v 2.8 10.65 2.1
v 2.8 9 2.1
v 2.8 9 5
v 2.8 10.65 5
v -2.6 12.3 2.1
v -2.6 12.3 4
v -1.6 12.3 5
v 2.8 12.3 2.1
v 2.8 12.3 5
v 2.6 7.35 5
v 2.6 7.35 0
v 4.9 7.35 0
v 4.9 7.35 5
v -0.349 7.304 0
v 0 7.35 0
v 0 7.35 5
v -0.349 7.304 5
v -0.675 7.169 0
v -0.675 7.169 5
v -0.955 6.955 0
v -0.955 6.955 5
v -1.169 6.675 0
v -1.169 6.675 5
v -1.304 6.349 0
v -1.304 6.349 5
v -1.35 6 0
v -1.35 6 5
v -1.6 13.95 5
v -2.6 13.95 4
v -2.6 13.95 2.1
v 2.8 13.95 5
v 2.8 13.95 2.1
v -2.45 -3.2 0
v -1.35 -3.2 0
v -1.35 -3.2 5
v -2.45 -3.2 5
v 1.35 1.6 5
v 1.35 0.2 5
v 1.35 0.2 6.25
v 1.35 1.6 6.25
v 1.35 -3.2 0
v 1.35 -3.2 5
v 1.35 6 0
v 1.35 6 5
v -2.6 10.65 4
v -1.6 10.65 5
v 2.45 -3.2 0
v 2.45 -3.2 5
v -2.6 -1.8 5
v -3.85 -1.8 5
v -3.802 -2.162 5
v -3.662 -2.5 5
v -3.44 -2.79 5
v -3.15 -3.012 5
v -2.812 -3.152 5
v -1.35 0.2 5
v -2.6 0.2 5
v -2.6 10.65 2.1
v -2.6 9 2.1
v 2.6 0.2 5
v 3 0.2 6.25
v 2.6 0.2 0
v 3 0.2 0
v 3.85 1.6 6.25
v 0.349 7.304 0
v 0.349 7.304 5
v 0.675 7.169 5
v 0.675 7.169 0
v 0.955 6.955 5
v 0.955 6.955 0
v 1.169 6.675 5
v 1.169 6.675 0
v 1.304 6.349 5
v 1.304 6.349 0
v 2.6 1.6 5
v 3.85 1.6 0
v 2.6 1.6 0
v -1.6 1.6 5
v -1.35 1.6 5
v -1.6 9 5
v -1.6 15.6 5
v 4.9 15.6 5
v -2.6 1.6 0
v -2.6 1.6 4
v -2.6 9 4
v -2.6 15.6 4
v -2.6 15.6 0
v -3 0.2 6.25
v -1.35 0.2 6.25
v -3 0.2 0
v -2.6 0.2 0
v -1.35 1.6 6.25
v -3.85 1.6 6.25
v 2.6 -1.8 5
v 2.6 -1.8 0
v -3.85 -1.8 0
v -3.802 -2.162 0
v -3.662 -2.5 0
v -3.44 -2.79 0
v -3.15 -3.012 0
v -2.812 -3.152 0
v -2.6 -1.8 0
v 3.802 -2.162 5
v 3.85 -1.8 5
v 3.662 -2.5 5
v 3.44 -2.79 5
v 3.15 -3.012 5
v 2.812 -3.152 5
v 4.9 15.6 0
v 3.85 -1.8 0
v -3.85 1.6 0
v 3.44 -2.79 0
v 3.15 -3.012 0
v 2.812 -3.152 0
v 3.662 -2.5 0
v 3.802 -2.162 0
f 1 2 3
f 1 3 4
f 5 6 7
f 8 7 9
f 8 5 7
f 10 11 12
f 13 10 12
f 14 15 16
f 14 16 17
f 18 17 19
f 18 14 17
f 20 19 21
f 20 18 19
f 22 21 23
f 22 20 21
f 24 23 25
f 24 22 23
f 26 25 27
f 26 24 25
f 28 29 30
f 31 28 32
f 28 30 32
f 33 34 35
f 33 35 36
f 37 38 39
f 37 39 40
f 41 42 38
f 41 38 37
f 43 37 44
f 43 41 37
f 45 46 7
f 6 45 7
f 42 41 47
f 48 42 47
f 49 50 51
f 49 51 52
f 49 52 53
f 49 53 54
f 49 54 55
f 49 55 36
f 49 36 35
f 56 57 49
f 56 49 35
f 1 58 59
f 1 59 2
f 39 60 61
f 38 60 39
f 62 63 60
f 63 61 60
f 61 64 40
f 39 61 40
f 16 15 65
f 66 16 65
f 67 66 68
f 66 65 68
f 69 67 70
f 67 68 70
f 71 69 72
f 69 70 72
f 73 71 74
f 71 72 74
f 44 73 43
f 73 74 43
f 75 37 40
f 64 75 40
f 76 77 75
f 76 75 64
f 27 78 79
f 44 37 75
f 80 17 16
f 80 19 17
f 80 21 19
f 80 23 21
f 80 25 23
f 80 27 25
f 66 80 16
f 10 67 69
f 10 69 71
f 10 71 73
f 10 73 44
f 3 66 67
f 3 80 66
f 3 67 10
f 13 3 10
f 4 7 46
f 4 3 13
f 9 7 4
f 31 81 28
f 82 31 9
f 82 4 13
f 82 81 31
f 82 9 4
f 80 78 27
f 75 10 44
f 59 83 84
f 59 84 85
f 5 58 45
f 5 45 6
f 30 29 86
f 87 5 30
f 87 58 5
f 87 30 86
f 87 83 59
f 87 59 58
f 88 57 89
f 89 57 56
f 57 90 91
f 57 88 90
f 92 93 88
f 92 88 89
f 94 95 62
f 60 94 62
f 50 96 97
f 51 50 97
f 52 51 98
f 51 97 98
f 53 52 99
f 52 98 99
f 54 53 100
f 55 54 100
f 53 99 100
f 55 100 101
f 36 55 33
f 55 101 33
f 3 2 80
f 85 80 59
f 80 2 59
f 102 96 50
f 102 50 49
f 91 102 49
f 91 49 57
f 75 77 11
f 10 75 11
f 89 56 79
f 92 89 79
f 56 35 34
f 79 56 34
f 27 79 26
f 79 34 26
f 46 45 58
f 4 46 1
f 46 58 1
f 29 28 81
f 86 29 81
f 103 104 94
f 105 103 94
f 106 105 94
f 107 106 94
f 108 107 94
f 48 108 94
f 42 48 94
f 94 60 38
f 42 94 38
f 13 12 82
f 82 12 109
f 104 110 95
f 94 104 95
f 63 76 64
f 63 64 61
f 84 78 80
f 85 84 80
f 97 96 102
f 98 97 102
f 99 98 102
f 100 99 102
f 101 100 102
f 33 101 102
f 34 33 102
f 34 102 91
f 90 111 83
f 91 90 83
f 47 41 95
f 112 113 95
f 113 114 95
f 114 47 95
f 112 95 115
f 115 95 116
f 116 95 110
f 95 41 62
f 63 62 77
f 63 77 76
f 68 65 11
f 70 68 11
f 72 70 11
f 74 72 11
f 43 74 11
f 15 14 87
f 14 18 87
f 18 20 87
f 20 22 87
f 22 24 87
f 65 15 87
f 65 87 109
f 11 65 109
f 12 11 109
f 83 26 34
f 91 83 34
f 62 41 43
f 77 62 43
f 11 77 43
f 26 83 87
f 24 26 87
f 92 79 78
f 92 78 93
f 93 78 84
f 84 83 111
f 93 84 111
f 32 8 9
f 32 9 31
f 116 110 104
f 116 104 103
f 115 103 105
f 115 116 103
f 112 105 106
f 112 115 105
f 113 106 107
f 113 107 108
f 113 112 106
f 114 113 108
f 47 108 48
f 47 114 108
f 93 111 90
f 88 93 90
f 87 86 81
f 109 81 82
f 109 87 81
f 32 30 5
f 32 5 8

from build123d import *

# Parameters (mm, degrees)
PAD017_DEPTH           = 5
PAD020_DEPTH           = 6.25
SKETCH105_W            = 7.5
SKETCH105_H            = 1.65
PAD074_DEPTH           = 5
SKETCH102_W            = 7.5
SKETCH102_H            = 1.65
PAD075_DEPTH           = 2.1
SKETCH103_W            = 2.1
SKETCH103_H            = 1.65
PAD076_DEPTH           = 5
SKETCH104_W            = 7.5
SKETCH104_H            = 1.65
PAD077_DEPTH           = 5
LINEARPATTERN024_COUNT = 2
LINEARPATTERN024_PITCH = 3.3
CHAMFER014_SIZE        = 1


with BuildPart() as bc_c:
    # Sketch034 → Pad017 (new body)
    with BuildSketch(Plane.XY):
        with BuildLine():
            Line((-1.35, -1.8), (-1.35, 6))
            ThreePointArc((0, 7.35), (-0.954594, 6.954594), (-1.35, 6))
            Line((0, 9), (0, 7.35))
            Line((-2.6, 9), (0, 9))
            Line((-2.6, -1.8), (-2.6, 9))
            Line((-3.85, -1.8), (-2.6, -1.8))
            ThreePointArc((-3.85, -1.8), (-3.439949, -2.789949), (-2.45, -3.2))
            Line((-1.35, -3.2), (-2.45, -3.2))
            Line((-1.35, -1.8), (-1.35, -3.2))
        make_face()
    extrude(amount=PAD017_DEPTH)

    # Sketch037 → Pad020 (join)
    with BuildSketch(Plane.XY):
        Polygon((-1.35, 0.2), (-1.35, 1.6), (-2.6, 1.6), (-3.85, 1.6), (-3, 0.2), (-2.6, 0.2), align=None)
    extrude(amount=PAD020_DEPTH)


with BuildPart() as bc_s_mirrored:
    # Mirror001: instance of _bc_c
    add(bc_c.part.mirror(Plane(origin=(0, 0, 0), x_dir=(0, 1, 0), z_dir=(-1, 0, 0))))


with BuildPart() as body039:
    # Fusion001 base: copy of _bc_c
    add(bc_c.part)

    # Fusion001: union _bc_s(mirrored)
    add(bc_s_mirrored.part)

    # Sketch105 → Pad074 (new body)
    with BuildSketch(Plane.XY):
        with Locations((1.15, 8.175)):
            Rectangle(SKETCH105_W, SKETCH105_H)
    extrude(amount=PAD074_DEPTH)

    # Sketch102 → Pad075 (join)
    with BuildSketch(Plane.XY):
        with Locations((1.15, 9.825)):
            Rectangle(SKETCH102_W, SKETCH102_H)
    pad075 = extrude(amount=PAD075_DEPTH)

    # Sketch103 → Pad076 (join)
    with BuildSketch(Plane.XY):
        with Locations((3.85, 9.825)):
            Rectangle(SKETCH103_W, SKETCH103_H)
    pad076 = extrude(amount=PAD076_DEPTH)

    # Sketch104 → Pad077 (join)
    with BuildSketch(Plane.XY):
        with Locations((1.15, 11.475)):
            Rectangle(SKETCH104_W, SKETCH104_H)
    pad077 = extrude(amount=PAD077_DEPTH)

    # LinearPattern024: Pad077, Pad076, Pad075 ×2
    with Locations(*[(0, i * LINEARPATTERN024_PITCH, 0) for i in range(1, LINEARPATTERN024_COUNT)]):
        add(pad077)
        add(pad076)
        add(pad075)

    # Chamfer014
    chamfer014_edges = [body039.edges().sort_by_distance(p)[0] for p in [
        (-2.6, 8.175, 5),
        (-2.6, 11.475, 5),
        (-2.6, 14.775, 5),
    ]]
    chamfer(chamfer014_edges, length=CHAMFER014_SIZE)


solid = body039.part
